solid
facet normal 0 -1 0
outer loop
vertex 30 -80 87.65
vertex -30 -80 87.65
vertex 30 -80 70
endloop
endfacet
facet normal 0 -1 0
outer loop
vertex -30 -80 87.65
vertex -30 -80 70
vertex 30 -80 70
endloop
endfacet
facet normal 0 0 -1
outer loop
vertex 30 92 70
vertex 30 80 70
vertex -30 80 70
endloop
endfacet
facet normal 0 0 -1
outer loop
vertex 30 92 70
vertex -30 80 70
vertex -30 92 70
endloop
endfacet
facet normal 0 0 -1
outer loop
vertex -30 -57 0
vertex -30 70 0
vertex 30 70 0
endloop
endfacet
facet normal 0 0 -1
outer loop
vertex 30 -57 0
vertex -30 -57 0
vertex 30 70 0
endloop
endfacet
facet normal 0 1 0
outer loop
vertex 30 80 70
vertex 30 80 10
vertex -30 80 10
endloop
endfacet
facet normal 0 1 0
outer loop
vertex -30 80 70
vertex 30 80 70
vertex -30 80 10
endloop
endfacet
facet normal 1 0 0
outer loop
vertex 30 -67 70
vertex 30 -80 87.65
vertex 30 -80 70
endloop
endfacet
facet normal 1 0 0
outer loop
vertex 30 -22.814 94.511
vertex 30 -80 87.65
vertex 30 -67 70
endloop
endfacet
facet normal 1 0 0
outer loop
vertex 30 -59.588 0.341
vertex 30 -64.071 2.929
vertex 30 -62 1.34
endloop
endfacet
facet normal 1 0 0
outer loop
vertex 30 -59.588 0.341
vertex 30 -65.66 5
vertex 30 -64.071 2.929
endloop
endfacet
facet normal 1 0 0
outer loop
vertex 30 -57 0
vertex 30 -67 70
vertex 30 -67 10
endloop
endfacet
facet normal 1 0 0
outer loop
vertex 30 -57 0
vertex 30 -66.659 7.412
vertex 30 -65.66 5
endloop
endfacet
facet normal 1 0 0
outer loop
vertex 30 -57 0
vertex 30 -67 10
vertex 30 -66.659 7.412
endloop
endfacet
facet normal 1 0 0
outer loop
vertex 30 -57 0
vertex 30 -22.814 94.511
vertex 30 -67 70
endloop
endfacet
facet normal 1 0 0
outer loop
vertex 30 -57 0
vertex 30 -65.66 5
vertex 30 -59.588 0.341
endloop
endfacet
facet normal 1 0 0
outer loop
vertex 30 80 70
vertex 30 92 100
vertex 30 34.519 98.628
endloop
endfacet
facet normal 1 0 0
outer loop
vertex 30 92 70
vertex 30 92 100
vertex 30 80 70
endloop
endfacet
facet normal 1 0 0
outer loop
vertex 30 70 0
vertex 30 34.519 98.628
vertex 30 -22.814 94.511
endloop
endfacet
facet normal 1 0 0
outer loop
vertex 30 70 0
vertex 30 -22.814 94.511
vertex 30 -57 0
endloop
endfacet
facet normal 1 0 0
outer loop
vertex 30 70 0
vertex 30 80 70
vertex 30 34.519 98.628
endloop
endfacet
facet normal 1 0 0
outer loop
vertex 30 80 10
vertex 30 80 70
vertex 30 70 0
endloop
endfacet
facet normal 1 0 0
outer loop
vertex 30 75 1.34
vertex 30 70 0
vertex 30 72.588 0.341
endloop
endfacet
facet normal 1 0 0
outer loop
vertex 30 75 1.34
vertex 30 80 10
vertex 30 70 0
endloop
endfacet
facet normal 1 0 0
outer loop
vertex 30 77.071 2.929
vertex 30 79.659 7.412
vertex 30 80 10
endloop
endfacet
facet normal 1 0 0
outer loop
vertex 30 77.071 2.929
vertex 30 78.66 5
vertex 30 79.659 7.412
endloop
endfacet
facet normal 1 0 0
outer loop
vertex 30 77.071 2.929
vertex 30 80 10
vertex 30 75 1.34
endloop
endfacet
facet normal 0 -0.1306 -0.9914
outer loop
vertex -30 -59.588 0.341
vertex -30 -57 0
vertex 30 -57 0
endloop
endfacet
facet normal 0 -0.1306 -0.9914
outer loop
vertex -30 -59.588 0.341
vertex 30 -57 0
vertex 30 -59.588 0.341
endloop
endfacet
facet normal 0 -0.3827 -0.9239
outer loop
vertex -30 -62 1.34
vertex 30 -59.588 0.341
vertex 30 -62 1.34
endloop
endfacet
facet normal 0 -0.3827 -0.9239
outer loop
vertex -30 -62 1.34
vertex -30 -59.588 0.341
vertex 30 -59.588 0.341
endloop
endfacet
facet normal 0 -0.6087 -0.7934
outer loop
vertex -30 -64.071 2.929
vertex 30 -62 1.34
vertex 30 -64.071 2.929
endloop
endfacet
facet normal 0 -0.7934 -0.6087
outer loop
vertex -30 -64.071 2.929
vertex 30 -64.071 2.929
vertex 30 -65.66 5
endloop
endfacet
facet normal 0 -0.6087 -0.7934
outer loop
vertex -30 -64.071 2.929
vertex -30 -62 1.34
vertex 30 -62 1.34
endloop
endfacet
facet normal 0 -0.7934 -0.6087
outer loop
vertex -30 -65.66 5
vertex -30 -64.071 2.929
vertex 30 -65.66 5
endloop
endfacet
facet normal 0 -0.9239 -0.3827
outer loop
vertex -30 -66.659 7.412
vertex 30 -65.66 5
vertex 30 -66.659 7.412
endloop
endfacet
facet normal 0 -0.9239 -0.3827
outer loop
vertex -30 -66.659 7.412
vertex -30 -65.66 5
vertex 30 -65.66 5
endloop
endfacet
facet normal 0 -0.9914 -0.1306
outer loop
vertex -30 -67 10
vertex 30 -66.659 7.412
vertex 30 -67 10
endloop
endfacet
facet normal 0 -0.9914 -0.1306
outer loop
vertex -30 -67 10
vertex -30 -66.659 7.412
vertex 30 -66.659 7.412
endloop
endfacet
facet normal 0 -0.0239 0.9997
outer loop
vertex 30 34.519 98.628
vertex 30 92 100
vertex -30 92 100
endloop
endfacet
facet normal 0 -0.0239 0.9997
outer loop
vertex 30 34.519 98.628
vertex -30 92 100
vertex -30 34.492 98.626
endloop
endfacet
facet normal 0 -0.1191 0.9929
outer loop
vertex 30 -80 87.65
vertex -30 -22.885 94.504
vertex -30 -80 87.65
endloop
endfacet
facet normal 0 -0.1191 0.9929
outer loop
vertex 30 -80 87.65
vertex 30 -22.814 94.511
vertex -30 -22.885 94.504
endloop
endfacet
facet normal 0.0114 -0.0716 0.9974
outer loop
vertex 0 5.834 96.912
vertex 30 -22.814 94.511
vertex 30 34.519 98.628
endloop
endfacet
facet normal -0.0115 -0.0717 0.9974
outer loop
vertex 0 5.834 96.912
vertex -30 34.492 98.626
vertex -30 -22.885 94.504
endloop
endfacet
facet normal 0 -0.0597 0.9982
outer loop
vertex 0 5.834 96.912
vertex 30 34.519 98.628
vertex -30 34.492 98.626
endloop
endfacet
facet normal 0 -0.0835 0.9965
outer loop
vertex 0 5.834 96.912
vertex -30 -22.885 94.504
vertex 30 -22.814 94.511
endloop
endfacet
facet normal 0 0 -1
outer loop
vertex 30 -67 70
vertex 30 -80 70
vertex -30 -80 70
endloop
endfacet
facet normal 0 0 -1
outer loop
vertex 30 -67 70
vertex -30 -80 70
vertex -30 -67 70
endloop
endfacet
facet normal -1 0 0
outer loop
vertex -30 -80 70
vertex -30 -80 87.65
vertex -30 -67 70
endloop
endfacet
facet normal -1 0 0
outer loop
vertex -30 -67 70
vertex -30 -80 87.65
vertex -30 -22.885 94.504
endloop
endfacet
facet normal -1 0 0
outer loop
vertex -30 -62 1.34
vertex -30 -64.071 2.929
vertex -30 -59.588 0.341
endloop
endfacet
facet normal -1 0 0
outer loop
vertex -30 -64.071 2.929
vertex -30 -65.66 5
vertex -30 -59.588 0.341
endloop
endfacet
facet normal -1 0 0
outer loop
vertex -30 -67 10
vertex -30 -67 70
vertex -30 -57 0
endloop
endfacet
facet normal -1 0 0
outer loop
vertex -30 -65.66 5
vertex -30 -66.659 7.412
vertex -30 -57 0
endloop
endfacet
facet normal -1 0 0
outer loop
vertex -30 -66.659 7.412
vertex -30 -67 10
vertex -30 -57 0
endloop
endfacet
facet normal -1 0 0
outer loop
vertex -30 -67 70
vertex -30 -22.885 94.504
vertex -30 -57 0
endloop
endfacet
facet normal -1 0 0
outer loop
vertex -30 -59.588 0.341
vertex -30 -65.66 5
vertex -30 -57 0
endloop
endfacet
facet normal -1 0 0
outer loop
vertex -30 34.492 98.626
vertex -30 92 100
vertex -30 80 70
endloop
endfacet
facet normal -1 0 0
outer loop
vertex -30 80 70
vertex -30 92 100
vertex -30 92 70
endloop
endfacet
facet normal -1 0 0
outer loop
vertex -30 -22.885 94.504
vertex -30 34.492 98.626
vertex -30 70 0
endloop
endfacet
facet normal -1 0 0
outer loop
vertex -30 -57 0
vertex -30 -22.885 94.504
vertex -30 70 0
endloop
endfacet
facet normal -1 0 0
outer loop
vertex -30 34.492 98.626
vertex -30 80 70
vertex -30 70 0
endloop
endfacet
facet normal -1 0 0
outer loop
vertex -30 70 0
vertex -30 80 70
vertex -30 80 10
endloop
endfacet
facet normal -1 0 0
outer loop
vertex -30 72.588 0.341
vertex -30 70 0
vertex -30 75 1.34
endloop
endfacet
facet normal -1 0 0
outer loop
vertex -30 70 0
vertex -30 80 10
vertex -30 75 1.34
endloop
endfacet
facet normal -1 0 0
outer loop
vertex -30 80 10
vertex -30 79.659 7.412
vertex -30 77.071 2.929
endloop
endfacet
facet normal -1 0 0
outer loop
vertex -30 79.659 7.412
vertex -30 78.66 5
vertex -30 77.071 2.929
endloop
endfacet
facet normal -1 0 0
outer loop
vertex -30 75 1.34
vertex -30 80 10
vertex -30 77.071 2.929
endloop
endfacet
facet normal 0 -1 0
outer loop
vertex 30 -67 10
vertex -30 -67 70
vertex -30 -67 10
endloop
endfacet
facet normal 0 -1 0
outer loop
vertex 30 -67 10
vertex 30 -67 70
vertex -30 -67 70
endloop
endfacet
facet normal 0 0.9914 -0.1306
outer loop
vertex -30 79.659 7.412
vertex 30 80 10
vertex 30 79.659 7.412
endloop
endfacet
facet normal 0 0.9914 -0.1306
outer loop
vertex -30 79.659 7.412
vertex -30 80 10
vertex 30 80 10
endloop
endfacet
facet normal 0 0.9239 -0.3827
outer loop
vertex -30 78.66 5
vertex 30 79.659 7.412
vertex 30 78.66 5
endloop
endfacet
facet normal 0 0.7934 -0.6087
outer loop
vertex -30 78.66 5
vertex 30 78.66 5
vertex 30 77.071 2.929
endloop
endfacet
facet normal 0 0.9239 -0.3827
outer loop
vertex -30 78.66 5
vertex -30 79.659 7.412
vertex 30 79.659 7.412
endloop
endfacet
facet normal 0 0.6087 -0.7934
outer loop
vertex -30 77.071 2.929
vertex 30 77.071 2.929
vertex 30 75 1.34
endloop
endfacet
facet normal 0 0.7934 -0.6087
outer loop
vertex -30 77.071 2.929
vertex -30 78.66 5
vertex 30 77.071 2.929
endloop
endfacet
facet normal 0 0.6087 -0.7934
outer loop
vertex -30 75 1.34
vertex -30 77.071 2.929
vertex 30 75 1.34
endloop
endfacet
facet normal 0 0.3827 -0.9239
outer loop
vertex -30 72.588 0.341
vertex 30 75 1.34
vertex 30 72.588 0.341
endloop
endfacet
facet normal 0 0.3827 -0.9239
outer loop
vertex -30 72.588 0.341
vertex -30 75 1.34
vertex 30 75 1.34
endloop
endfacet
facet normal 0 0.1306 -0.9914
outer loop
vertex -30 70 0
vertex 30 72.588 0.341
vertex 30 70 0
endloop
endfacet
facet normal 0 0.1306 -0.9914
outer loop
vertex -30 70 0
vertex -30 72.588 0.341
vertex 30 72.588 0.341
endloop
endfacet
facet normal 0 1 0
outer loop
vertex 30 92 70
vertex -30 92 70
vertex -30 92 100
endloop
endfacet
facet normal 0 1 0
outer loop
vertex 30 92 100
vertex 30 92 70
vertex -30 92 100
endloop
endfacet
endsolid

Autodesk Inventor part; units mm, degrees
ref_plane "YZ Plane" through (0, 0, 0) normal (1, 0, 0) x (0, 1, 0)
ref_plane "XZ Plane" through (0, 0, 0) normal (0, 1, 0) x (-1, 0, 0)
ref_plane "XY Plane" through (0, 0, 0) normal (0, 0, 1) x (1, 0, 0)
sketch "Skizze1" plane through (0, 0, 0) normal (0, 0, 1) x (1, 0, 0)
  line L0 (-30, -80) -> (30, -80)
  line L1 (30, -80) -> (30, 80)
  line L2 (30, 80) -> (-30, 80)
  line L3 (-30, 80) -> (-30, -80)
  line L4 (-30, -80) -> (30, 80) construction
  line L5 (30, -80) -> (-30, 80) construction
  point P0 (0, 0)
  dimension "d0" = 60
  dimension "d1" = 160
extrude "Extrusion1" add sketch "Skizze1" along normal blind 100
sketch "Skizze5" plane through (30, -80, 0) normal (1, 0, 0) x (0, 0, -1)
  line L0 (0, 0) -> (-70, 0)
  line L1 (-70, 0) -> (-70, 13)
  line L2 (-70, 13) -> (0, 13)
  line L3 (0, 13) -> (0, 0)
  point P0 (0, 80)
  dimension "d15" = 70
  dimension "d16" = 13
extrude "Extrusion5" cut sketch "Skizze5" against normal through all
sketch "Skizze6" plane through (30, 80, 100) normal (1, 0, 0) x (0, 0, -1)
  line L0 (100, 0) -> (0, 0) projected
  line L1 (0, 0) -> (30, 0)
  line L2 (30, 0) -> (30, 12)
  line L3 (30, 12) -> (0, 12)
  line L4 (0, 12) -> (0, 0)
  point P0 (100, -80)
  point P1 (30, 0)
  dimension "d24" = 30
  dimension "d25" = 12
extrude "Extrusion6" add sketch "Skizze6" against normal up to surface (60 mm away)
fillet "Rundung1" radius 10 2 edges at (0, -67, 0) (0, 80, 0)
sketch "Skizze7" plane through (30, -80, 70) normal (1, 0, 0) x (0, 0, -1)
  line L0 (-30, 0) -> (-17.65, 0)
  line L1 (0, 0) -> (-30, 0) projected
  line L2 (-30, 0) -> (-30, 172) projected
  line L3 (-30, 0) -> (-30, 172)
  spline S0 degree 2 poles (-30, 172) (-30, 85.6679) (-17.65, 0) knots 0 0 0 1 1 1
  point P0 (70, 80)
  dimension "d27" = 12.35
extrude "Extrusion7" cut sketch "Skizze7" against normal up to next
equation "\"G_L\" = 0"
equation "\"G_H\" = 0"
equation "\"G_B\" = 0"
properties part number "canopy" material "PC/ABS-Kunststoff"
